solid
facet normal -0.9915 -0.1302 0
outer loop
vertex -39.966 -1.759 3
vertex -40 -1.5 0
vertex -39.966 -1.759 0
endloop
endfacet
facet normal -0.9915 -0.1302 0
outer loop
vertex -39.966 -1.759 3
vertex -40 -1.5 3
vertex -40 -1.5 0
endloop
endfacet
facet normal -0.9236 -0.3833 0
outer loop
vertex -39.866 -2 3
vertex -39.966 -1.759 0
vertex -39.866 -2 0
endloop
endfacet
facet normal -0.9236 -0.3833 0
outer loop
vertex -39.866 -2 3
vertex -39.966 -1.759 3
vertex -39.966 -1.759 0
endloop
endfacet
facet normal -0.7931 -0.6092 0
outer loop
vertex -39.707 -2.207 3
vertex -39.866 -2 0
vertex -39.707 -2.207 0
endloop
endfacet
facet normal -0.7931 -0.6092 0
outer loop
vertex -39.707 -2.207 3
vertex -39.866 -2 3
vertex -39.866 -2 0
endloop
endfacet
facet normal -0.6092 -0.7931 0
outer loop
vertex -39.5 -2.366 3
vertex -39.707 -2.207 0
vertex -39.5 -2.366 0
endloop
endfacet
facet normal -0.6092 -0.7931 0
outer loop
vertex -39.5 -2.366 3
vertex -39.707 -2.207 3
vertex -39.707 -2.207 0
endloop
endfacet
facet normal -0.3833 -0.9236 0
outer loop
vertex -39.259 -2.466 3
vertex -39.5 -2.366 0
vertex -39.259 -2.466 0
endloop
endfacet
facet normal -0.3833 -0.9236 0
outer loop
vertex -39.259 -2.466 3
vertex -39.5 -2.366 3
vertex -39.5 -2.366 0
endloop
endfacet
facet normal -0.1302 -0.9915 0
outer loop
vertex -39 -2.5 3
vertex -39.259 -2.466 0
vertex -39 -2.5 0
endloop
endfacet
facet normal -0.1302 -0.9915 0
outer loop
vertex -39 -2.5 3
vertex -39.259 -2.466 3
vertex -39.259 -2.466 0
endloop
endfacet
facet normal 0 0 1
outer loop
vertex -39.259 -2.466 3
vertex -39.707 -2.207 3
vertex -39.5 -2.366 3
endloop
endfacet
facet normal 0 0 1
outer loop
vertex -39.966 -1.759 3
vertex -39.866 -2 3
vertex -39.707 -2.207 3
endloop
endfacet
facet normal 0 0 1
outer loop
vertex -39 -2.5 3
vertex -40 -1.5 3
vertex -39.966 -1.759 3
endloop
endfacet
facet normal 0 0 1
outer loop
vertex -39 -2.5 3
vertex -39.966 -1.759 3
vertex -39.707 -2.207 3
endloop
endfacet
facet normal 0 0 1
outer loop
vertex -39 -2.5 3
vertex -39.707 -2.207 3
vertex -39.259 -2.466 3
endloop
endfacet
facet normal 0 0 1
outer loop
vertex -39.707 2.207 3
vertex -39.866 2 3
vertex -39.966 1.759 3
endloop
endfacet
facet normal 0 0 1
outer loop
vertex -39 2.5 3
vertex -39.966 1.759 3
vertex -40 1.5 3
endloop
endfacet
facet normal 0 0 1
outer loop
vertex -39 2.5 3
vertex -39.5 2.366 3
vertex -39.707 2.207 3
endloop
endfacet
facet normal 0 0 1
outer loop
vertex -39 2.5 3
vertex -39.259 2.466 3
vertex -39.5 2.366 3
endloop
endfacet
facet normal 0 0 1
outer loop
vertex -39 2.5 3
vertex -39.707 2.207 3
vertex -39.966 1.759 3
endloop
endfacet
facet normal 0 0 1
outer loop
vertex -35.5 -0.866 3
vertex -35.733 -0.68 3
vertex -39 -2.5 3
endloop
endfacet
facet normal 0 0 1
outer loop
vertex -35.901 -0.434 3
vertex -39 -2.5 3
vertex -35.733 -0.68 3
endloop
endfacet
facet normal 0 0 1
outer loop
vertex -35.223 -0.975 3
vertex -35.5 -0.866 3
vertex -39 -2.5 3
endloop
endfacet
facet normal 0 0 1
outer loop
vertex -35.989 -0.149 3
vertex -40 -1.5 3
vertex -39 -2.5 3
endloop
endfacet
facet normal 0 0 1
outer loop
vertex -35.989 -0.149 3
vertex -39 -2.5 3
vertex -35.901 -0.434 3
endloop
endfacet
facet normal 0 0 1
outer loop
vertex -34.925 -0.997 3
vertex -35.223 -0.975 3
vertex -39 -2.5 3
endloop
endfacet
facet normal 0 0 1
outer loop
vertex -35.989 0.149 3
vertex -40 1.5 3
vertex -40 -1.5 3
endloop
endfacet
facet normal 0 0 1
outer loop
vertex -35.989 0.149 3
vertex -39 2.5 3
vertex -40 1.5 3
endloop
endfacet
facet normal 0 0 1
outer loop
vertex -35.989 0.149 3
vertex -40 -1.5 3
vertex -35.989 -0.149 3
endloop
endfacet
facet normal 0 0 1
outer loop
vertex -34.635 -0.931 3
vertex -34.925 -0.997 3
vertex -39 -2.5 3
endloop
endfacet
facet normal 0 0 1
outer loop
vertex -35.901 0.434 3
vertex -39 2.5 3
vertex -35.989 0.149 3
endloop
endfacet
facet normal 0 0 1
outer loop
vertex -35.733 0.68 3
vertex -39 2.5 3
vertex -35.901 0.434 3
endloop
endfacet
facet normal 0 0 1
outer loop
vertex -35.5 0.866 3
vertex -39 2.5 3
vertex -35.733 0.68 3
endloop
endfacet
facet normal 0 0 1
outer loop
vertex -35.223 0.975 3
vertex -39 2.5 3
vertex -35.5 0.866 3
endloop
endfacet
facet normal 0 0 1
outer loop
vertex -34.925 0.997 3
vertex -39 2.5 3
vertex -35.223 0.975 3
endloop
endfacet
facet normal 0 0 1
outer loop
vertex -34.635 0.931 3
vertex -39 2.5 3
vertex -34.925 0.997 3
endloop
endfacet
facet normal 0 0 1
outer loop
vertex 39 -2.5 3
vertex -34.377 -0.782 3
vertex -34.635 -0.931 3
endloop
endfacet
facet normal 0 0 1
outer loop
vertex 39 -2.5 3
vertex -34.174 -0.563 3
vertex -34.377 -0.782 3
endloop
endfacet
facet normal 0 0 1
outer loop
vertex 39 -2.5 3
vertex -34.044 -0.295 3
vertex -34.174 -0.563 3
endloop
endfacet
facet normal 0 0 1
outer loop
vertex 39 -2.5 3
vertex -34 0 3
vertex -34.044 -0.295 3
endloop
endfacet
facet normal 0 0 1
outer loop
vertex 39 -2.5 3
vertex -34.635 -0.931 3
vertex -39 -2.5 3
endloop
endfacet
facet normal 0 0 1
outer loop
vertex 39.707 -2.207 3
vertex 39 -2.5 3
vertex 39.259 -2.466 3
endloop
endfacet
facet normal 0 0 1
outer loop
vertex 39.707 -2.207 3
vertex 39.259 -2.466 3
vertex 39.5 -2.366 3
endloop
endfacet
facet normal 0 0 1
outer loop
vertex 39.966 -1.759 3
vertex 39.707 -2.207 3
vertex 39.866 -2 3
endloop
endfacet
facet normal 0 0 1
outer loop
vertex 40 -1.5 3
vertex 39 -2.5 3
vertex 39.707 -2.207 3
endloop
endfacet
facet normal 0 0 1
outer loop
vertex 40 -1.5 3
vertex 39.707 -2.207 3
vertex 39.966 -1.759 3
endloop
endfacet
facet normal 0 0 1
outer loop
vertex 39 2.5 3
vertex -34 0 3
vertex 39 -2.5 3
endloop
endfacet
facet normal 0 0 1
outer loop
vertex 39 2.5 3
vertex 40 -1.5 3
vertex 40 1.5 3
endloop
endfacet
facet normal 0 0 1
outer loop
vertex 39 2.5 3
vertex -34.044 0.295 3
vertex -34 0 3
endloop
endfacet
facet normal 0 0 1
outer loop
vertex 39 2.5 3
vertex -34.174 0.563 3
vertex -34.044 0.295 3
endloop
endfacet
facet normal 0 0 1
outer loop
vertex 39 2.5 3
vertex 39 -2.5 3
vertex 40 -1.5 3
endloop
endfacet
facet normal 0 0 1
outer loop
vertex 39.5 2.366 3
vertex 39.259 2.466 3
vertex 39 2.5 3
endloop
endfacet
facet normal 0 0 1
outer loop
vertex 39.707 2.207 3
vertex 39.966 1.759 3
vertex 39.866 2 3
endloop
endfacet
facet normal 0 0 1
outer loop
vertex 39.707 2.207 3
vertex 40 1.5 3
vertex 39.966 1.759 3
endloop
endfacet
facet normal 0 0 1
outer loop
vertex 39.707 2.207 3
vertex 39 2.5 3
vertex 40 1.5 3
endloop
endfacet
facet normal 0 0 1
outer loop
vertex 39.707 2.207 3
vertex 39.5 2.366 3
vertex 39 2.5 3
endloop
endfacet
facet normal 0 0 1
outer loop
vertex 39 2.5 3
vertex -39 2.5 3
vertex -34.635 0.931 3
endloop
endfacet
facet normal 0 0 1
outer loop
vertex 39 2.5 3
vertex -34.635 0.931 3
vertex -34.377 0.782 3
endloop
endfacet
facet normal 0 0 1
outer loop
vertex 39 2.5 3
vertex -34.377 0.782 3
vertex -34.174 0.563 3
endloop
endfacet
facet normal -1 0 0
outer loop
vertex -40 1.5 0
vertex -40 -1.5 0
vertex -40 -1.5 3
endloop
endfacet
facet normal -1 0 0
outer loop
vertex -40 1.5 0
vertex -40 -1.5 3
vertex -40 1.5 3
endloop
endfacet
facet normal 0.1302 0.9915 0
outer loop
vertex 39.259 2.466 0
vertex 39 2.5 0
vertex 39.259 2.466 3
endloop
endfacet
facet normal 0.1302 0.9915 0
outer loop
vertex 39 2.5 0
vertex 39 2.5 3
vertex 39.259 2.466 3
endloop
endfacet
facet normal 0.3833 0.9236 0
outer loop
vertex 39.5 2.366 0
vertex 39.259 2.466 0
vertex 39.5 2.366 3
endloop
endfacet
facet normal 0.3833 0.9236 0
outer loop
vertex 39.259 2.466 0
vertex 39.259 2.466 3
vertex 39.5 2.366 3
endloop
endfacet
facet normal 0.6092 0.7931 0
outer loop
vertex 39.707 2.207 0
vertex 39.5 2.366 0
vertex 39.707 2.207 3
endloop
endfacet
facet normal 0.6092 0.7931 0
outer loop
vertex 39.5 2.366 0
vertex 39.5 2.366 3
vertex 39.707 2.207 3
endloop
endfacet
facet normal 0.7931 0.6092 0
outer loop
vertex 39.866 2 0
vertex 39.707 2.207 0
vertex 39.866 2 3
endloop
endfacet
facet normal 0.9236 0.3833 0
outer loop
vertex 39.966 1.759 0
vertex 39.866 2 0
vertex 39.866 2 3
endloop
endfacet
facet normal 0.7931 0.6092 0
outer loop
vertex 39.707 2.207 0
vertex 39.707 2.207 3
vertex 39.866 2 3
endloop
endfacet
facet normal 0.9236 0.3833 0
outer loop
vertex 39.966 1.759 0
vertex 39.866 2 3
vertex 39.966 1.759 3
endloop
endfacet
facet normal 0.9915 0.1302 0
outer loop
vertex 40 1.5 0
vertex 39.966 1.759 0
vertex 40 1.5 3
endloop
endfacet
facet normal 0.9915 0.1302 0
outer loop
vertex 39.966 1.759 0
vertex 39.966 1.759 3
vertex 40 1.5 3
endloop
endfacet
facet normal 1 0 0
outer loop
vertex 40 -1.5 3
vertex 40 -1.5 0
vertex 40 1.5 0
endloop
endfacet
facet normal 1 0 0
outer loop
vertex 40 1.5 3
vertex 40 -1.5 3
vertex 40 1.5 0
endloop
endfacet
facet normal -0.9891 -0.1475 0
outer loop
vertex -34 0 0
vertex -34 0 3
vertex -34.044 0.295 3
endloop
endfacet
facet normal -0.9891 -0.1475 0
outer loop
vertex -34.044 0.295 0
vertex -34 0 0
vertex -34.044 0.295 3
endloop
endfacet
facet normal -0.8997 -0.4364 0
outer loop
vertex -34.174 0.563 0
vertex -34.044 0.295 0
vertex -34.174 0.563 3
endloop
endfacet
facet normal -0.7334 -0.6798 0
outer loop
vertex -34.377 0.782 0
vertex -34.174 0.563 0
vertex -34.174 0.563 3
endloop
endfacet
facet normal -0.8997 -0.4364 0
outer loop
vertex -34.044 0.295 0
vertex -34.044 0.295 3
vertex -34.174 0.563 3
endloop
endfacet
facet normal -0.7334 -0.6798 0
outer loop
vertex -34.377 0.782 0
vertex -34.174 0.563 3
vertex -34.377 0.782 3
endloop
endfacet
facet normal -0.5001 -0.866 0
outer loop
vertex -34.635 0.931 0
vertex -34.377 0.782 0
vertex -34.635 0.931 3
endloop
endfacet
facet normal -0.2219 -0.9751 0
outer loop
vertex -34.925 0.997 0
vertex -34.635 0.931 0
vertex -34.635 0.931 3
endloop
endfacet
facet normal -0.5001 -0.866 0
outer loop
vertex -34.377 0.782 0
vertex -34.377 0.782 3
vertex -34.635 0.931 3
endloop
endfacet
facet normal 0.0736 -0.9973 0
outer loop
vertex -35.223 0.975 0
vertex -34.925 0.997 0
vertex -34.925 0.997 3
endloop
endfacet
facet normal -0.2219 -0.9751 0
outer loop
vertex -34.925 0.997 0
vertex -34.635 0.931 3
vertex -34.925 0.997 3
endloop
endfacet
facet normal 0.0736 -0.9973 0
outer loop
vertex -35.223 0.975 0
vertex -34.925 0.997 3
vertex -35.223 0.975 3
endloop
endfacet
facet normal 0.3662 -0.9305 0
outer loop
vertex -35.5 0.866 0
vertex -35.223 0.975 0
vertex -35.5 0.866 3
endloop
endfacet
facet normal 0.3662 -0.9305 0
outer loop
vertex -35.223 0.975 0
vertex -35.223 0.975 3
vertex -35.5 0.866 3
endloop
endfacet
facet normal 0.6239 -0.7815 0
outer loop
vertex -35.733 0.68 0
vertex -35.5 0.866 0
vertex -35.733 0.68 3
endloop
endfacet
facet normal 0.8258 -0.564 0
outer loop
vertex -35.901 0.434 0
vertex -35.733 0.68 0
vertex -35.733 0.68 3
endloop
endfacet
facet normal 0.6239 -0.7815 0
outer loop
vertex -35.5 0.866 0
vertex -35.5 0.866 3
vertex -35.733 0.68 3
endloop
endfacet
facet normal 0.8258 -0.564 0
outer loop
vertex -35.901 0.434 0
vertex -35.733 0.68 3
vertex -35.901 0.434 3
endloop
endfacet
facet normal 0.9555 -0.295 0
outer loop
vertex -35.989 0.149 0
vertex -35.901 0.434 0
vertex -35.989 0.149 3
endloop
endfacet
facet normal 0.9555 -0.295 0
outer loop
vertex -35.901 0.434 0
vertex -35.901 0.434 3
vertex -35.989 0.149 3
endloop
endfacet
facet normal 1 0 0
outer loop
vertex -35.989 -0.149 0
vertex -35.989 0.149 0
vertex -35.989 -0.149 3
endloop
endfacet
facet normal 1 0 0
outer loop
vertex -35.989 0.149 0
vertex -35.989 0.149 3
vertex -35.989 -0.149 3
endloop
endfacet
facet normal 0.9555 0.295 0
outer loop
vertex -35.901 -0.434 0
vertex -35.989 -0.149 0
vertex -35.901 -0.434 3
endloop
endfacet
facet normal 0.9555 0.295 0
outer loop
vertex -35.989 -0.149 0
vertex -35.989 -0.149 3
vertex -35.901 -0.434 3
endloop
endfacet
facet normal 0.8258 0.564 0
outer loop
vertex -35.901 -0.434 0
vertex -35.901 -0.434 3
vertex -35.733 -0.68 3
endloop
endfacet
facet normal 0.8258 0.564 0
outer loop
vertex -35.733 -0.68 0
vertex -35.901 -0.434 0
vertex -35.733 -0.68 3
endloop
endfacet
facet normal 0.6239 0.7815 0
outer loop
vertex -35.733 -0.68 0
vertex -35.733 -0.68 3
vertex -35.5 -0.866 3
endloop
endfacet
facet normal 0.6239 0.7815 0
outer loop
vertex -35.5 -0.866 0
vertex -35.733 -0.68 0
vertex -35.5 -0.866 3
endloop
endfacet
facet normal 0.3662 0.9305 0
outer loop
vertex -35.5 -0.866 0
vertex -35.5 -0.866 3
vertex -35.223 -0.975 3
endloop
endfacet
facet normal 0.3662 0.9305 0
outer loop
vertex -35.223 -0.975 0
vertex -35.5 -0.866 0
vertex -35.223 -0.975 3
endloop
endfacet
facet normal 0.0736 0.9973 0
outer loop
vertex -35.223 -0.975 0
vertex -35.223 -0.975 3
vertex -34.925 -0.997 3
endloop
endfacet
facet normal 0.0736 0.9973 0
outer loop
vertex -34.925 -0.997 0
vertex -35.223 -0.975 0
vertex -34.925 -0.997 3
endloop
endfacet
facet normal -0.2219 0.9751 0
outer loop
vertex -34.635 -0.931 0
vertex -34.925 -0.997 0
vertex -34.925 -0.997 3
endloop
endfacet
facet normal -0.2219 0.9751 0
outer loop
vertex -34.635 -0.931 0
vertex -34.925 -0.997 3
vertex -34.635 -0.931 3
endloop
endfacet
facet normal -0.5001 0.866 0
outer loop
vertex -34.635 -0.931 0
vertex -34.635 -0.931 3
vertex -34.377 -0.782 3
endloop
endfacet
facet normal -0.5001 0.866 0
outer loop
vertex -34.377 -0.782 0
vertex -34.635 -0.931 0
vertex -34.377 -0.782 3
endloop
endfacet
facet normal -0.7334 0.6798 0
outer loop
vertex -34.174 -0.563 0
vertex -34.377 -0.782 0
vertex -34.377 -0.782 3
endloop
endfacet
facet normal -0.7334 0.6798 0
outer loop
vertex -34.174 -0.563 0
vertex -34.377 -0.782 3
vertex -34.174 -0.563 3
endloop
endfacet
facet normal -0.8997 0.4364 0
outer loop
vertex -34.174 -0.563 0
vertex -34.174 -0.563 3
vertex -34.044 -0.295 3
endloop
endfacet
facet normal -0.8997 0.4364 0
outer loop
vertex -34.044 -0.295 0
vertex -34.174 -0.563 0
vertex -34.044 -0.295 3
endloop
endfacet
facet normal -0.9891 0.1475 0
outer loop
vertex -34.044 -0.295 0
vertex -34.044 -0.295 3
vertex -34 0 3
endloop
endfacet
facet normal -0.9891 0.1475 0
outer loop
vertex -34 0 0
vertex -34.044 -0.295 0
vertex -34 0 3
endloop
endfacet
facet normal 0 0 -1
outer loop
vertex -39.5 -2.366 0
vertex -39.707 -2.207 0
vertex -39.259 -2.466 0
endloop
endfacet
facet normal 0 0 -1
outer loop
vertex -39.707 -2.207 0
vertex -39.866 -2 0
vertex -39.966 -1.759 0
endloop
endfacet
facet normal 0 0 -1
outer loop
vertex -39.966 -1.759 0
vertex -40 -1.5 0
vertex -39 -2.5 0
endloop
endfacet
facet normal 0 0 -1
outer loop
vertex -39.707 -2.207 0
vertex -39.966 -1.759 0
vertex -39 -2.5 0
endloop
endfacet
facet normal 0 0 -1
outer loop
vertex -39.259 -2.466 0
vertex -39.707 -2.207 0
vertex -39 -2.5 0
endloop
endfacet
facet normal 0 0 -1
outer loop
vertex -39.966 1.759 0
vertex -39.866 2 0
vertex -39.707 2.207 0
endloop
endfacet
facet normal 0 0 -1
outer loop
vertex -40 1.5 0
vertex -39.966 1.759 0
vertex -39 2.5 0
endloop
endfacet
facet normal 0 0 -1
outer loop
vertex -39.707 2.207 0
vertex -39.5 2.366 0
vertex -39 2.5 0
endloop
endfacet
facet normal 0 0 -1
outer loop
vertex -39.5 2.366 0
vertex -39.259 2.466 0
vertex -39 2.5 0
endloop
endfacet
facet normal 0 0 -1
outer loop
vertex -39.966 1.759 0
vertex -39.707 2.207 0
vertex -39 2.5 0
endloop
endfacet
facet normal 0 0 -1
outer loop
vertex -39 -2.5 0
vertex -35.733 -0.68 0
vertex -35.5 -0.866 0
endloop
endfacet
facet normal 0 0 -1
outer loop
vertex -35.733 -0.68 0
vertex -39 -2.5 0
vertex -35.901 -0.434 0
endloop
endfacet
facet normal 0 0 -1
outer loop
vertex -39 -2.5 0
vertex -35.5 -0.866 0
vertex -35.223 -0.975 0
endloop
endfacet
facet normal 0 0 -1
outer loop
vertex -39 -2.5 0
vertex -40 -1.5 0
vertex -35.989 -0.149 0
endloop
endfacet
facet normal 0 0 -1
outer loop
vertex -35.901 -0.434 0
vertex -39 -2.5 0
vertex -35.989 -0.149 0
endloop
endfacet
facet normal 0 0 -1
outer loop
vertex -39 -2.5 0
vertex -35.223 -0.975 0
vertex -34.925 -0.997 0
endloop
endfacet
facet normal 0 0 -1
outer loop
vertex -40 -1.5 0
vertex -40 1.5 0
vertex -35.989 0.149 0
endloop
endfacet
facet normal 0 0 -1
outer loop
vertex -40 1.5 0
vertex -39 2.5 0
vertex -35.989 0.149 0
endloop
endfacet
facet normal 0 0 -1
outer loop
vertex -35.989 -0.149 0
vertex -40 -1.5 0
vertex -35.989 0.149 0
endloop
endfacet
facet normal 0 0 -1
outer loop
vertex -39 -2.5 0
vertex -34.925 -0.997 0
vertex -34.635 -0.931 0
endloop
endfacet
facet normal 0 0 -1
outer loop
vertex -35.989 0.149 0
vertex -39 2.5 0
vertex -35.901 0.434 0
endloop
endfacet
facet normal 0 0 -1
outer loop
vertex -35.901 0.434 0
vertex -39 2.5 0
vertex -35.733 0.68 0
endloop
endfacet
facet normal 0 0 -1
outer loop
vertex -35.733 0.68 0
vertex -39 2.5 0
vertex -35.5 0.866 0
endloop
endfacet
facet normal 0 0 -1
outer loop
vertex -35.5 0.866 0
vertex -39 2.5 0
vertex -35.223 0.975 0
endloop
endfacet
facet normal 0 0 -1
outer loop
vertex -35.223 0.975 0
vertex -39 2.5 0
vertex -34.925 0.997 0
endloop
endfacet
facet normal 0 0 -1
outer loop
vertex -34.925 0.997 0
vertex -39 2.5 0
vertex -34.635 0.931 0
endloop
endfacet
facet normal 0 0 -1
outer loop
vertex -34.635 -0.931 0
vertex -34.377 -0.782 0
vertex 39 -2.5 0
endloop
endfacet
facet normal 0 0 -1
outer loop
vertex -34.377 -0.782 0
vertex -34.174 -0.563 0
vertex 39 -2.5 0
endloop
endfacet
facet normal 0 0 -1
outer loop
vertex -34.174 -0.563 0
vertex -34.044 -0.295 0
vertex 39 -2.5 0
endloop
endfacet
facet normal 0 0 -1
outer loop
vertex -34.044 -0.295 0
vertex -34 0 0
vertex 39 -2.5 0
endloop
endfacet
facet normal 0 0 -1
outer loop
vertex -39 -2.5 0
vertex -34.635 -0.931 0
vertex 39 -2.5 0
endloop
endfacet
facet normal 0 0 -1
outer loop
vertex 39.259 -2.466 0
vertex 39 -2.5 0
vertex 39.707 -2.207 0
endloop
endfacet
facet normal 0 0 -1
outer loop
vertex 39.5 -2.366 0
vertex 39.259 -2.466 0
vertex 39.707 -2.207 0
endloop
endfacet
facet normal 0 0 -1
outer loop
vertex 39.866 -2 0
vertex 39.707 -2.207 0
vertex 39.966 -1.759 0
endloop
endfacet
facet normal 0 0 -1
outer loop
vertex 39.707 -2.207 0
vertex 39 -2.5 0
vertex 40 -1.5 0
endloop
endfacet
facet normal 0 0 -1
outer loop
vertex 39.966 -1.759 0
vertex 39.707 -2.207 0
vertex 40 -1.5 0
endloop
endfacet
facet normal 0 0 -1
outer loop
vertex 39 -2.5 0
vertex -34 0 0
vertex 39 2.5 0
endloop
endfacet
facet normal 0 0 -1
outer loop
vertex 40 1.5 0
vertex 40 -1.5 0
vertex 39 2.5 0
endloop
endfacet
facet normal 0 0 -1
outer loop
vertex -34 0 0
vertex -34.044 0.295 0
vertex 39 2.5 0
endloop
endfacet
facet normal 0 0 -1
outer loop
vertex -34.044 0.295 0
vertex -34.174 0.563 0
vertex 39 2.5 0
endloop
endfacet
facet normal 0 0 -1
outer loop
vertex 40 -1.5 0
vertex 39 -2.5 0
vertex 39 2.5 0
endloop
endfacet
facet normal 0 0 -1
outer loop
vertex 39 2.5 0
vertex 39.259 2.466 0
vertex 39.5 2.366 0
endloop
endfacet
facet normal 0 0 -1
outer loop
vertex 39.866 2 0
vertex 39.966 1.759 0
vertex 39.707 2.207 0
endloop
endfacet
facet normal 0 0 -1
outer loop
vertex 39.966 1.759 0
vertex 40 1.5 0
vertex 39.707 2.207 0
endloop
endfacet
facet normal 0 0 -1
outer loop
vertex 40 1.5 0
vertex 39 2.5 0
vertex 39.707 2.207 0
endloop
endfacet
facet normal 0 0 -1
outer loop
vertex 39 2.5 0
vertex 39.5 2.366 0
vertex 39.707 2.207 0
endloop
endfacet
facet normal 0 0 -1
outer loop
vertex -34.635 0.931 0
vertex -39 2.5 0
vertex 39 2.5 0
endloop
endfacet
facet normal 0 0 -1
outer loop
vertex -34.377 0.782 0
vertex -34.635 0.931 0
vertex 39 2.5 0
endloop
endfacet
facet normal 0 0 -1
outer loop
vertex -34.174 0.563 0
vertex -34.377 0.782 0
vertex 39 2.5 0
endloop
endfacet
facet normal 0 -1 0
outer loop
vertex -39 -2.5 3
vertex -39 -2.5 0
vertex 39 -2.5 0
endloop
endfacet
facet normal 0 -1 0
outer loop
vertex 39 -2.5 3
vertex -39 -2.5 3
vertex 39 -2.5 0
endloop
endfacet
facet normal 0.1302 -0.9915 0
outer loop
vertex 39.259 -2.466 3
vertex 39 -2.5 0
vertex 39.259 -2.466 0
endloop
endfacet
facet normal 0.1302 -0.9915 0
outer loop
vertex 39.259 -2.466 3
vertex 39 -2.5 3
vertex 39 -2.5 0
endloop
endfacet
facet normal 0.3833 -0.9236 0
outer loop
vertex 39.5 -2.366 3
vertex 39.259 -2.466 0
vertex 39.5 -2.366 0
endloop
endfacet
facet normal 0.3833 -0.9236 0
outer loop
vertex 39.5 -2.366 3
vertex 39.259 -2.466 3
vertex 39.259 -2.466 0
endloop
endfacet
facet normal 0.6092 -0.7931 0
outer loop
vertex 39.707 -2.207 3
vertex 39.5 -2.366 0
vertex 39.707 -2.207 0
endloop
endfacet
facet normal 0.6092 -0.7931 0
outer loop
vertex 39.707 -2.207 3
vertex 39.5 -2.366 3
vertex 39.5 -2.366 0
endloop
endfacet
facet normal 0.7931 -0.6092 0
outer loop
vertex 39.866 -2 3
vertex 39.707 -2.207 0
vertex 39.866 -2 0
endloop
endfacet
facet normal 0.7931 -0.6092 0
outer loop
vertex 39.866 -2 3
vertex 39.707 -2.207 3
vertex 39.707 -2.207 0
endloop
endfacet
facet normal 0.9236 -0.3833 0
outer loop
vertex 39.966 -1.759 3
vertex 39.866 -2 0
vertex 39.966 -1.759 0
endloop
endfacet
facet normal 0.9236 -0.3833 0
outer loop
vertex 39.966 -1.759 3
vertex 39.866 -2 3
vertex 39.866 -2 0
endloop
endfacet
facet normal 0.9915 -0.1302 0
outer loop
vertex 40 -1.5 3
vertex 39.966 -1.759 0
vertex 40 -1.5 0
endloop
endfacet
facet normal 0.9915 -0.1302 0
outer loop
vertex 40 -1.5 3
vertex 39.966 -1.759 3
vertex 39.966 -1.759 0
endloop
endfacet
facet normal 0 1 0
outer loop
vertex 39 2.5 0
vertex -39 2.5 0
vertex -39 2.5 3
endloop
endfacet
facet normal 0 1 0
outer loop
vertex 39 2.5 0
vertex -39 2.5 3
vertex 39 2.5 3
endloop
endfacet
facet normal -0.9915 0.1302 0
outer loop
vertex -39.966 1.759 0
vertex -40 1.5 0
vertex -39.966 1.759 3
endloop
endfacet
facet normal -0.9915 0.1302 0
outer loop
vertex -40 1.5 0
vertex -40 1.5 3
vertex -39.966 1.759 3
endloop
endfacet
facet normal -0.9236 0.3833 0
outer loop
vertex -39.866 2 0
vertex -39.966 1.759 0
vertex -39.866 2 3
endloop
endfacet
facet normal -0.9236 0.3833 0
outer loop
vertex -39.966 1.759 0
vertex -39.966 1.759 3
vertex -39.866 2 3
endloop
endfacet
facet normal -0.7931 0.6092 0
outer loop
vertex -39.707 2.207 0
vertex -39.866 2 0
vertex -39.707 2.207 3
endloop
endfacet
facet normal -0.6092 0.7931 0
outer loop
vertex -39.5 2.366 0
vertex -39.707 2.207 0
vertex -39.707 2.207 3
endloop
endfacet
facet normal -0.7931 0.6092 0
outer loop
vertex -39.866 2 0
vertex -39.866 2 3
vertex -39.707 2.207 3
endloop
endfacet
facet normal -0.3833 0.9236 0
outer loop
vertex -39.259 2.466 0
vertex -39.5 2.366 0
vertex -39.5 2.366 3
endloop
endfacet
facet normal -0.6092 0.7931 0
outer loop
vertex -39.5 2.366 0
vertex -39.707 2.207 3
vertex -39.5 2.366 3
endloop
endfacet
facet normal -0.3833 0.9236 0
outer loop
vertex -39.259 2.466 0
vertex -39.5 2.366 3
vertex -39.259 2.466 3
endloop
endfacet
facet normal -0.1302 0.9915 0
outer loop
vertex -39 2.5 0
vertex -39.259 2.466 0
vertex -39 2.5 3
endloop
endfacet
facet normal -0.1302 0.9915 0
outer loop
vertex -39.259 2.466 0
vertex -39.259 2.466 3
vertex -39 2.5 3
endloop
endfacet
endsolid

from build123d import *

# Parameters (mm, degrees)
SKETCH1_W           = 80
SKETCH1_H           = 5
BOSS_EXTRUDE1_DEPTH = 3
SKETCH2_R           = 1
CUT_EXTRUDE1_DEPTH  = 41.190172928
FILLET1_R           = 1


with BuildPart() as part:
    # Sketch1 → Boss-Extrude1 (new body)
    with BuildSketch(Plane.XY):
        Rectangle(SKETCH1_W, SKETCH1_H)
    extrude(amount=BOSS_EXTRUDE1_DEPTH)

    # Sketch2 → Cut-Extrude1 (cut, through all)
    with BuildSketch(Plane.XY.offset(3)):
        with Locations((-35, 0)):
            Circle(SKETCH2_R)
    extrude(amount=-CUT_EXTRUDE1_DEPTH, mode=Mode.SUBTRACT)

    # Fillet1
    fillet1_edges = [part.edges().sort_by_distance(p)[0] for p in [
        (-40, 2.5, 1.5),
        (40, 2.5, 1.5),
        (40, -2.5, 1.5),
        (-40, -2.5, 1.5),
    ]]
    fillet(fillet1_edges, radius=FILLET1_R)


solid = part.part
